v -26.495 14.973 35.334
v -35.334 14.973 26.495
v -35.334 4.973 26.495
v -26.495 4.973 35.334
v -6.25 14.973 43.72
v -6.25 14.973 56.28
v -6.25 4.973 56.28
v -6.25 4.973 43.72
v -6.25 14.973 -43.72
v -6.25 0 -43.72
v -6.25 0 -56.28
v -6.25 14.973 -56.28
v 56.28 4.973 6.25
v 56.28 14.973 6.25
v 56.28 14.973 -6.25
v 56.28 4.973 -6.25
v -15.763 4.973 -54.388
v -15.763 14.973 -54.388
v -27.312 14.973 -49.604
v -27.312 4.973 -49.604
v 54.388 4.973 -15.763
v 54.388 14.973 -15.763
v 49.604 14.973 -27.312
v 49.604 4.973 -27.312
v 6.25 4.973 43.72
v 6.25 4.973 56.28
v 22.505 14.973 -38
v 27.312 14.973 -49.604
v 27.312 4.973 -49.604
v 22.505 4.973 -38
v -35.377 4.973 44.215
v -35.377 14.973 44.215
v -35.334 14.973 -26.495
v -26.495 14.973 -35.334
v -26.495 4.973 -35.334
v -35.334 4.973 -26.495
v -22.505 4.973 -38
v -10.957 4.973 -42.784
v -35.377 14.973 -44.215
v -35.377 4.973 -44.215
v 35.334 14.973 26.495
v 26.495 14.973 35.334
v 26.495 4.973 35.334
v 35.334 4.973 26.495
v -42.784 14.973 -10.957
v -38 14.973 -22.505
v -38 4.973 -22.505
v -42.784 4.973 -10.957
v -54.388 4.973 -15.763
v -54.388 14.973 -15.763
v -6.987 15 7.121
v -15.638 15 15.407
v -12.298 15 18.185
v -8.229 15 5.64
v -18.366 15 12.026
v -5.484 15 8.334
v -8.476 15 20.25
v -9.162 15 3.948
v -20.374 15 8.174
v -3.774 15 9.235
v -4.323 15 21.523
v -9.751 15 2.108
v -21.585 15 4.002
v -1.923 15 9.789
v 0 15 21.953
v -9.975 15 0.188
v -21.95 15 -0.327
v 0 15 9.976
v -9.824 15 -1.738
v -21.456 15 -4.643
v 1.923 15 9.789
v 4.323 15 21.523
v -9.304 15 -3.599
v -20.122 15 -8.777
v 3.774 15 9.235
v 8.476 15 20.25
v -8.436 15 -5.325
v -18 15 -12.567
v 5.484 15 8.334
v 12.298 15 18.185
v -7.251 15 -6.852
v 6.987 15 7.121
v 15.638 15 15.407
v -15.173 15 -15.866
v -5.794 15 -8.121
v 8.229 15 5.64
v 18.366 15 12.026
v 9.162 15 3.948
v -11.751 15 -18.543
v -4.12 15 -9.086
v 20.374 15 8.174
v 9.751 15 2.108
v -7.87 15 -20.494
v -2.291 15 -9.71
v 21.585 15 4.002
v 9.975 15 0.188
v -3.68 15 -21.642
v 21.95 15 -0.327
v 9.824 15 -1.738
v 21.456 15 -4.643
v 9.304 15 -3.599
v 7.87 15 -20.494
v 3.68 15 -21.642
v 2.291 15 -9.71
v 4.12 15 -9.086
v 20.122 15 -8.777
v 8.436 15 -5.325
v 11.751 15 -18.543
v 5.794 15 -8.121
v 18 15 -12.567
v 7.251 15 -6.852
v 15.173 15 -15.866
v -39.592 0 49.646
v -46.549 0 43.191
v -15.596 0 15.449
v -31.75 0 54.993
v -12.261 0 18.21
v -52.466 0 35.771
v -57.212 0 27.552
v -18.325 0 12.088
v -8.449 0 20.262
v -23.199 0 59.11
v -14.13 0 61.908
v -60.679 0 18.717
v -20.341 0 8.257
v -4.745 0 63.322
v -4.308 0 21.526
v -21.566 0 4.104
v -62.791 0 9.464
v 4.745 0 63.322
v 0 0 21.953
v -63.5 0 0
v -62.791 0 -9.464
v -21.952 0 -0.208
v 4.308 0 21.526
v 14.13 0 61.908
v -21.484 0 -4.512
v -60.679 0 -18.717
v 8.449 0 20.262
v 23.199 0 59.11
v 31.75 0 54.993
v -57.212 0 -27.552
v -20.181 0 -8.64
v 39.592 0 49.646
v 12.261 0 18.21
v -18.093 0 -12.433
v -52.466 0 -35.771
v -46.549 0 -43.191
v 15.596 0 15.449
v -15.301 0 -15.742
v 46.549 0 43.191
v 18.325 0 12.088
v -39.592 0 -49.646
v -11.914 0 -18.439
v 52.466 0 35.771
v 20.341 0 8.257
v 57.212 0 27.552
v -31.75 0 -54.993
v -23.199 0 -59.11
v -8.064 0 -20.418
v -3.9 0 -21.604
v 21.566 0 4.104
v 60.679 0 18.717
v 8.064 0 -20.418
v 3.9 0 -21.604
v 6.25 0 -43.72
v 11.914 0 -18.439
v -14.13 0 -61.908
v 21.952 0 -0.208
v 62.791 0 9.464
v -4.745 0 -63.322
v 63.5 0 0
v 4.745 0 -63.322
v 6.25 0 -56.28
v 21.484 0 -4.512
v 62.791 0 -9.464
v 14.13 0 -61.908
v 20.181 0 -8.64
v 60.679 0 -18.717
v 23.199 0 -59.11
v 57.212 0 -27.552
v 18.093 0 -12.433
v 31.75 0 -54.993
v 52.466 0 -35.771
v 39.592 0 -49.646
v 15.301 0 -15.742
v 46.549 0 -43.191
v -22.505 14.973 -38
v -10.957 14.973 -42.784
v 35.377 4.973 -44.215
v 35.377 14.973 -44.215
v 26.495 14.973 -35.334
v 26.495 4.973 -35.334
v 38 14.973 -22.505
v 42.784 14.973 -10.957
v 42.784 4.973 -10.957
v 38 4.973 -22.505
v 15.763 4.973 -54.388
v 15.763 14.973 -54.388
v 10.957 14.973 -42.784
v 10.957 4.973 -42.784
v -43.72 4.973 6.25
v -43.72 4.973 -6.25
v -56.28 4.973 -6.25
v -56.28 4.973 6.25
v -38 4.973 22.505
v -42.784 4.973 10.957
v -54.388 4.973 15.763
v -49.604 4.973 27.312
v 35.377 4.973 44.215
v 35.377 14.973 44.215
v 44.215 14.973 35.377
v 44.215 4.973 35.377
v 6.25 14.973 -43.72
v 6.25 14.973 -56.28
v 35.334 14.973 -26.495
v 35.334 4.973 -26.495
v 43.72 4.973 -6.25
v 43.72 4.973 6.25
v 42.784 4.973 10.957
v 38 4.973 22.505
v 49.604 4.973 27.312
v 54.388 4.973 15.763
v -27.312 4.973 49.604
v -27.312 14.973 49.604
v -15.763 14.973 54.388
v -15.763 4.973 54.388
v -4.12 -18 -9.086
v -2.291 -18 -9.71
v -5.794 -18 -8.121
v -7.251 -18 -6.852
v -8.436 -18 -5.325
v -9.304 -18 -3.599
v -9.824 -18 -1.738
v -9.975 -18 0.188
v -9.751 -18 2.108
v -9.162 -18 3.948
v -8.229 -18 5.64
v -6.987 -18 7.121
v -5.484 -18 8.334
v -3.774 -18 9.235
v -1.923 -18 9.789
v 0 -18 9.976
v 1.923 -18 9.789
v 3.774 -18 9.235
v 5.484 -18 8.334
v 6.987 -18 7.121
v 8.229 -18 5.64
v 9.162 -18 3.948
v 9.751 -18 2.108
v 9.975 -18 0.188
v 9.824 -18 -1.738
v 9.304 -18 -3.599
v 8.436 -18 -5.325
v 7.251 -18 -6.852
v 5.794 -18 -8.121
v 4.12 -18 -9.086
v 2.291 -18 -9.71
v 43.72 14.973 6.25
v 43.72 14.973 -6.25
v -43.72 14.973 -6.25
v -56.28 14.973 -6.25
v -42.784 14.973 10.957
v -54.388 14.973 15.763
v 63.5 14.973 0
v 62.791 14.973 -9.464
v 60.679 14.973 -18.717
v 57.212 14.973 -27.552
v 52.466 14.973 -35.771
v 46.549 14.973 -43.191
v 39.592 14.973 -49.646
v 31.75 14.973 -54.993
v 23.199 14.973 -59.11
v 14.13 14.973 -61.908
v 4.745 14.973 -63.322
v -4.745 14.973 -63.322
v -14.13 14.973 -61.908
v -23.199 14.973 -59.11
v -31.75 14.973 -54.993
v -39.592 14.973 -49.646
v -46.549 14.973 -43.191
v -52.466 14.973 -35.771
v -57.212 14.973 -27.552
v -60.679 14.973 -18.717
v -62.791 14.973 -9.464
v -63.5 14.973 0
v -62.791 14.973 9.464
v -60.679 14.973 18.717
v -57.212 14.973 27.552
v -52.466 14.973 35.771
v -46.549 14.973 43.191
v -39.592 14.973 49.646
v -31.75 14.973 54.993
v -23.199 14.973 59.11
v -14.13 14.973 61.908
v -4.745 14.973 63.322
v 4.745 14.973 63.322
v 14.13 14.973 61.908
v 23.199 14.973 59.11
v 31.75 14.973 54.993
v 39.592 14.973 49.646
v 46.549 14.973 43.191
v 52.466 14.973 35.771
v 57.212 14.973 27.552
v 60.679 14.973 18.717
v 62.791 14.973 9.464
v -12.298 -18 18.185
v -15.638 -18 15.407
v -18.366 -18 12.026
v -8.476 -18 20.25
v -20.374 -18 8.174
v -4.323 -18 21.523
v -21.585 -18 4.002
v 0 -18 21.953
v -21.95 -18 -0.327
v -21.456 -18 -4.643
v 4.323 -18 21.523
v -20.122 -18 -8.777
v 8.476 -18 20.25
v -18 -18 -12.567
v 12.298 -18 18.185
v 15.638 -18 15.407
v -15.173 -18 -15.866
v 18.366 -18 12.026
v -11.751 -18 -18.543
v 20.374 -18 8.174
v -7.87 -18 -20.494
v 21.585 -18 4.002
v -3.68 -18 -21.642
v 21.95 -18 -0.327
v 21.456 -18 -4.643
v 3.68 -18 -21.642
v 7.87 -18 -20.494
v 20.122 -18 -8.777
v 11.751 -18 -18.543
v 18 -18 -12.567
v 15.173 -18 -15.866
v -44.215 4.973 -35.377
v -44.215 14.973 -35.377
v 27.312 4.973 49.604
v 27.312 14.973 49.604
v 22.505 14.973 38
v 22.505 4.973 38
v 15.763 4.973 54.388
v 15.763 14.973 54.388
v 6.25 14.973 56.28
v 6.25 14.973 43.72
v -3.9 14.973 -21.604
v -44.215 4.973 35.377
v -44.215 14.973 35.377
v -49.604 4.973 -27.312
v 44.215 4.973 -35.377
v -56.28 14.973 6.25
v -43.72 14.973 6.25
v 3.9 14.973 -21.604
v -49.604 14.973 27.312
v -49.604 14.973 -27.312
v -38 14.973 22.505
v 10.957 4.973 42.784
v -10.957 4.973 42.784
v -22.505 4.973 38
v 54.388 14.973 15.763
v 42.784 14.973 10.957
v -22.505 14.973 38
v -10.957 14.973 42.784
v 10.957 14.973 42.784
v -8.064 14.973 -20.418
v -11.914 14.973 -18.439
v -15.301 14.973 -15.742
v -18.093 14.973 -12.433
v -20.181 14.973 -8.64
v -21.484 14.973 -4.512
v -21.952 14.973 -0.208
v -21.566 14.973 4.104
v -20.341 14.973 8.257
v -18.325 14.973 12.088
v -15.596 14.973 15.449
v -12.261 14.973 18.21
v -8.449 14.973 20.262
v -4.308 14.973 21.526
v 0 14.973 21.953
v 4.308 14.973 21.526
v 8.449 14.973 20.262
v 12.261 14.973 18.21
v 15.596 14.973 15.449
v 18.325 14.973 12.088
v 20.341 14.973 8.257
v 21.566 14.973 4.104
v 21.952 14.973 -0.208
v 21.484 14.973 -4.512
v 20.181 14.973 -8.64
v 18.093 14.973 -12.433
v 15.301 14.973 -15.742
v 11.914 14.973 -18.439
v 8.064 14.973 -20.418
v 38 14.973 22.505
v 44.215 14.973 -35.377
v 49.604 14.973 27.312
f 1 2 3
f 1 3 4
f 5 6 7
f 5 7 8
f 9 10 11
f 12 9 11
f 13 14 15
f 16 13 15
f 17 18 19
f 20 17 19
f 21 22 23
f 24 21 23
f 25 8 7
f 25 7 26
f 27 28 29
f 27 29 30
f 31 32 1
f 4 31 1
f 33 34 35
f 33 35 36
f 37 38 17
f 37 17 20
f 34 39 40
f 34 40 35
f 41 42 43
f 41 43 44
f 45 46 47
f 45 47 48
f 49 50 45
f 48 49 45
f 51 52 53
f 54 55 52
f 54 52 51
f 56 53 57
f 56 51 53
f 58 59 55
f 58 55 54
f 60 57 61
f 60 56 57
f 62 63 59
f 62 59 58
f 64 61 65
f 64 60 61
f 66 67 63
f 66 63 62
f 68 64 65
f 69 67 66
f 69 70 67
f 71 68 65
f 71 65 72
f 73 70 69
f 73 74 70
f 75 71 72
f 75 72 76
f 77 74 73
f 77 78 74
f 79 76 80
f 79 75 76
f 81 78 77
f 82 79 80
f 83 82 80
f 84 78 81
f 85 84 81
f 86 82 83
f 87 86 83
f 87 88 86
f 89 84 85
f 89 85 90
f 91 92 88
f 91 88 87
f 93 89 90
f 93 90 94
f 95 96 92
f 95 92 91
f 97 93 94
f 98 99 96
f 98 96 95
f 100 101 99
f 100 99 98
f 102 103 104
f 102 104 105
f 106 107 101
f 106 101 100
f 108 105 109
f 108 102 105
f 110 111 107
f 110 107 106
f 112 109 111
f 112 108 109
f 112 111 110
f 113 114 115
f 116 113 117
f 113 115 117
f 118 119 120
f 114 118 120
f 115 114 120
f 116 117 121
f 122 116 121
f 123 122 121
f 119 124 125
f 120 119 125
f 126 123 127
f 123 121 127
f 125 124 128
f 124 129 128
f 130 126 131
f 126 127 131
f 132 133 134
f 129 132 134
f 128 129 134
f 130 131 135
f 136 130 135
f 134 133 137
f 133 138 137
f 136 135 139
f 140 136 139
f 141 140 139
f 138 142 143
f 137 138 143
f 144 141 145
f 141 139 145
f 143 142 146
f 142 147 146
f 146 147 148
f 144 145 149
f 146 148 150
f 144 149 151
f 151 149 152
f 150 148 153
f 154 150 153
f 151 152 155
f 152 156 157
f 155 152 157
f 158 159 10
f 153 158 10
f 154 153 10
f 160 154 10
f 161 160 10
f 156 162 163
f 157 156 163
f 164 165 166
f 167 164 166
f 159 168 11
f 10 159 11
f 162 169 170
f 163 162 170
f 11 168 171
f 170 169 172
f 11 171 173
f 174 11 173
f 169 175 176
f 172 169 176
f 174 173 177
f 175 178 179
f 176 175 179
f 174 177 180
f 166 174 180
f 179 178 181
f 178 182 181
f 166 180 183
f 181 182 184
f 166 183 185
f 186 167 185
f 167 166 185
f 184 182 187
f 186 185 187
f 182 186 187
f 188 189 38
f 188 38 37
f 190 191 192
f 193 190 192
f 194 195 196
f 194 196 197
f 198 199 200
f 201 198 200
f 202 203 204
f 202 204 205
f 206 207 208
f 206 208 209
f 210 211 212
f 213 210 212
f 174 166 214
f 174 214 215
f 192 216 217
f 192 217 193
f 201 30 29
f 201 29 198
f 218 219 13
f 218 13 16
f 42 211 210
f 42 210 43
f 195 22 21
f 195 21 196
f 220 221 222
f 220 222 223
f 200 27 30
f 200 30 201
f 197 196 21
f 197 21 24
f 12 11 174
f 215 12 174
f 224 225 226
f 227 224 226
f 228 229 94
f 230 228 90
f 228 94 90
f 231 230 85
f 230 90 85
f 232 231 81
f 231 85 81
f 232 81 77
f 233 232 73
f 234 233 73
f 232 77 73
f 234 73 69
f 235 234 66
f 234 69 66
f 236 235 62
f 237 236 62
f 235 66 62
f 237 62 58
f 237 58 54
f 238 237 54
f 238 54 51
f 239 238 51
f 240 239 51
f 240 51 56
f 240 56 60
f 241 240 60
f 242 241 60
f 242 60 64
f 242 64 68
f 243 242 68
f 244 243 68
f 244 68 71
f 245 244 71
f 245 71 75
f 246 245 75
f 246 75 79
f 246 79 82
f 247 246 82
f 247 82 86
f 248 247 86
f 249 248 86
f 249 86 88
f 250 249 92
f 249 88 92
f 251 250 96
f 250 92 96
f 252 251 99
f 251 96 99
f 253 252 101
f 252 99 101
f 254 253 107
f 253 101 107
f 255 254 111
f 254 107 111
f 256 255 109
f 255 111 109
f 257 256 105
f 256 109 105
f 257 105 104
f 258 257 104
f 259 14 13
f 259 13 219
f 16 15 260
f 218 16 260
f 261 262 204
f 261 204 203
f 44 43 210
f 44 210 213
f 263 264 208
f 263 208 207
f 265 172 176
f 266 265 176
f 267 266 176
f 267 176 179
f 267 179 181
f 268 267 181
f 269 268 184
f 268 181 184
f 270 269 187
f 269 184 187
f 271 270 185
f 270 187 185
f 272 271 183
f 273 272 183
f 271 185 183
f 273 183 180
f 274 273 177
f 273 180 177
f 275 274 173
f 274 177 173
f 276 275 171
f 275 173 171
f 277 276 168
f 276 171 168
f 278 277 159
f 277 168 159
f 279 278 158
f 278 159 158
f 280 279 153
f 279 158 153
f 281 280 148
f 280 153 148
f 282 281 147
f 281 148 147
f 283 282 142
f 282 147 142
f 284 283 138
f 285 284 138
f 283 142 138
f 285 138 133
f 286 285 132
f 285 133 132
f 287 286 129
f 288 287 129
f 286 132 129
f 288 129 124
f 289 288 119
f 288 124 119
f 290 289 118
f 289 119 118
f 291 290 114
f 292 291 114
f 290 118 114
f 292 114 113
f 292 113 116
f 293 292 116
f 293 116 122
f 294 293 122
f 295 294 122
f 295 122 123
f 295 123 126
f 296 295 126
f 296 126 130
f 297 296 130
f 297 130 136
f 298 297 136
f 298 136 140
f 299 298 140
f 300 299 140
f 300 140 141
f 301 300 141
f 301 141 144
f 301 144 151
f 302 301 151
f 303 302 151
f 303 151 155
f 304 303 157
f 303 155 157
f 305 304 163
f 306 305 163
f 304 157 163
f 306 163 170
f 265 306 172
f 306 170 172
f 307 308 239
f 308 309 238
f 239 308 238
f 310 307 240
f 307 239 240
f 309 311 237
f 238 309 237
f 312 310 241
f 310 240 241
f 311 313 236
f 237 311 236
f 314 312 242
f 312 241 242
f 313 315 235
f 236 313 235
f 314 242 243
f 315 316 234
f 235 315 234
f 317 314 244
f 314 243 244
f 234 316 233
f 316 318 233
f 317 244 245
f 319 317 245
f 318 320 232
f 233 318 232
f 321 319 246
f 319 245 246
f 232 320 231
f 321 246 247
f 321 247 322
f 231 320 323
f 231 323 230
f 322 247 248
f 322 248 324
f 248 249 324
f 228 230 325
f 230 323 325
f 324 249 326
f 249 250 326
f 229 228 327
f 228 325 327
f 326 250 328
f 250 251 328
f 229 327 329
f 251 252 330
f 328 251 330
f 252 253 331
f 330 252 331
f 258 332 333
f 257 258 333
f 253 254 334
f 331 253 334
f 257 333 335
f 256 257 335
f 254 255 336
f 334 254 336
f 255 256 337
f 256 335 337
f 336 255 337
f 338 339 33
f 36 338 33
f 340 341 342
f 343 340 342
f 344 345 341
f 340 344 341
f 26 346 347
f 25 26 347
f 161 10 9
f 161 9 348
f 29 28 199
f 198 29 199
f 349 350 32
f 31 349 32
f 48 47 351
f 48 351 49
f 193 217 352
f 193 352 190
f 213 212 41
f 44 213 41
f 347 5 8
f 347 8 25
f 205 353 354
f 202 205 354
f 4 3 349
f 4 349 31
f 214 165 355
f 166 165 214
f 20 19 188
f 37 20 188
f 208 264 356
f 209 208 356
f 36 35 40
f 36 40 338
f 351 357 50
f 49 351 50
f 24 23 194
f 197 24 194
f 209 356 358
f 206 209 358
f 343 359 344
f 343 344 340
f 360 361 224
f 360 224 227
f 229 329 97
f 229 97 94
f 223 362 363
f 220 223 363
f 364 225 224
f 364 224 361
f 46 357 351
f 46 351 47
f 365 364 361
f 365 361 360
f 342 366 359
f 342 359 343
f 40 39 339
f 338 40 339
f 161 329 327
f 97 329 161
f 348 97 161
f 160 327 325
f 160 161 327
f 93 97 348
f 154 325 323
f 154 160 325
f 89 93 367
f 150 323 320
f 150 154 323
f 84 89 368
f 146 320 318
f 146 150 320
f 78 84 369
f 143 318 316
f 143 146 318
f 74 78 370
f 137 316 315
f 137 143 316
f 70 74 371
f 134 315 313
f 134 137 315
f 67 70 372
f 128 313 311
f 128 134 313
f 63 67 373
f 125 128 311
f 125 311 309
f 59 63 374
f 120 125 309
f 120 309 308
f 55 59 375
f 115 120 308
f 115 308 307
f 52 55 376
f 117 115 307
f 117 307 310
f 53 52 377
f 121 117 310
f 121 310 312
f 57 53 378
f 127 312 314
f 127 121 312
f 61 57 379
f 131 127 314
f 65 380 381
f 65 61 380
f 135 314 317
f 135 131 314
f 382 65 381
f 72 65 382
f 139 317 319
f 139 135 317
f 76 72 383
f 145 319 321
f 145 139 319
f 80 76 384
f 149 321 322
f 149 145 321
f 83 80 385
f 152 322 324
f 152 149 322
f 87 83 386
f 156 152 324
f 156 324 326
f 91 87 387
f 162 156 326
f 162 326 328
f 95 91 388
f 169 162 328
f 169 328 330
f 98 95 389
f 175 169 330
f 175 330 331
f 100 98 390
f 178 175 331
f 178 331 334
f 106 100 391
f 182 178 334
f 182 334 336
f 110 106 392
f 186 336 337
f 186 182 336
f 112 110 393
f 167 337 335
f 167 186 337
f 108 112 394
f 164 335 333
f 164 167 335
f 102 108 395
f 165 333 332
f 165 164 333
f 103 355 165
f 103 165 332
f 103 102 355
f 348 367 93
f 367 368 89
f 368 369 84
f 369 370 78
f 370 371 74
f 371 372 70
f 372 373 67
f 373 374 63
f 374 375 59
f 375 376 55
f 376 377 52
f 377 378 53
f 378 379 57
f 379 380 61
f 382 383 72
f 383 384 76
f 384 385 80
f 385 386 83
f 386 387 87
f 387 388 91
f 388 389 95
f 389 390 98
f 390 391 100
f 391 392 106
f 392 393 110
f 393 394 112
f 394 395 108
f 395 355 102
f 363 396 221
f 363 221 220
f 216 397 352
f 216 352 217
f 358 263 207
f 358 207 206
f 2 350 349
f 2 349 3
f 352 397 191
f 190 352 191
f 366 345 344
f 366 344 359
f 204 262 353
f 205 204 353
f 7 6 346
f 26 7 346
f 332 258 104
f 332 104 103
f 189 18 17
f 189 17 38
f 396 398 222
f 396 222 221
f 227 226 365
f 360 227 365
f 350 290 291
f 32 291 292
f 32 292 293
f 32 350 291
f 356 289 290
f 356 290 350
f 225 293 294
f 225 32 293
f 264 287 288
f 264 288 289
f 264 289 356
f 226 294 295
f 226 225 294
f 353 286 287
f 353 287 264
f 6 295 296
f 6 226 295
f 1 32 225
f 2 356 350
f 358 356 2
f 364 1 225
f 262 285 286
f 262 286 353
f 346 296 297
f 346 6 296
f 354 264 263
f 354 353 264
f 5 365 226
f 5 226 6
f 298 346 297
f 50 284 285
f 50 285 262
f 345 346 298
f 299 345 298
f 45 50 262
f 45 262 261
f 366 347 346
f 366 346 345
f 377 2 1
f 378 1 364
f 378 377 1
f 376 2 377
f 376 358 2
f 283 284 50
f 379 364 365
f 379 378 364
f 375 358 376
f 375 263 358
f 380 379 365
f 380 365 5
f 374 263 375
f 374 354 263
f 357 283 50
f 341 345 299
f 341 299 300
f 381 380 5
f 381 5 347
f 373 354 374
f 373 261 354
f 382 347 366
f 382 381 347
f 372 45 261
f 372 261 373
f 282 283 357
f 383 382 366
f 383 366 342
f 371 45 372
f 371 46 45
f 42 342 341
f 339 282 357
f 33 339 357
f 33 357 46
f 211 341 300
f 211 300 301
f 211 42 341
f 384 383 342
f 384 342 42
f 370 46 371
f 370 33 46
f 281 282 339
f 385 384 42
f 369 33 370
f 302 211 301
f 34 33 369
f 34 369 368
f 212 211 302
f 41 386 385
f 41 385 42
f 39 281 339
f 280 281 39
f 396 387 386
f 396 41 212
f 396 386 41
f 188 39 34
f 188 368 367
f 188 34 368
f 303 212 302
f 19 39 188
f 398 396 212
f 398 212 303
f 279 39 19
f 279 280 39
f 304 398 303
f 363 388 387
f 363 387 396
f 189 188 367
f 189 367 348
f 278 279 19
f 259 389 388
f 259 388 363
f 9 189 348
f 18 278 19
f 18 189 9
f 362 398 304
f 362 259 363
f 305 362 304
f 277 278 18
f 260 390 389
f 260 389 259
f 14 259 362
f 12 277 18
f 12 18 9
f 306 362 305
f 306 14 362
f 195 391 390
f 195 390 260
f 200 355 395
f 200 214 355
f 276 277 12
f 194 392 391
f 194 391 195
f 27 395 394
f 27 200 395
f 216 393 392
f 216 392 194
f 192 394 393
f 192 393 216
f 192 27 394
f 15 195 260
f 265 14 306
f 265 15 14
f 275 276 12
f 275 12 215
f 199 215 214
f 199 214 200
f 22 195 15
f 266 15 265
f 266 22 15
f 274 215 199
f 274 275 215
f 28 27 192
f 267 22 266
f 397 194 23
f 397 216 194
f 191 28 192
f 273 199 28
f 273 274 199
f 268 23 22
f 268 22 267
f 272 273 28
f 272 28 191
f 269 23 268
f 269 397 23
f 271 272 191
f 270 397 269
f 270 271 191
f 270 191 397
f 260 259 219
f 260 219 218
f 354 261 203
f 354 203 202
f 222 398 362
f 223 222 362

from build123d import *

# Parameters (mm, degrees)
SKETCH1_R                = 63.5
BOSS_EXTRUDE1_DEPTH      = 14.973360437
SKETCH2_W                = 12.5
SKETCH2_H                = 12.56
CUT_EXTRUDE1_DEPTH       = 10
CIRPATTERN1_COUNT        = 16
SKETCH5_W                = 12.5
SKETCH5_H                = 12.56
CUT_EXTRUDE3_DEPTH       = 37
CUT_EXTRUDE3_DEPTH_BACK  = 31
SKETCH6_R                = 17.625930659
CUT_EXTRUDE4_DEPTH       = 26
CUT_EXTRUDE4_DEPTH_BACK  = 37
CUT_EXTRUDE9_DEPTH       = 19
CUT_EXTRUDE9_DEPTH_BACK  = 11
SKETCH13_R               = 21.952850423
BOSS_EXTRUDE4_DEPTH      = 15
BOSS_EXTRUDE4_DEPTH_BACK = 18
SKETCH16_R               = 9.976383377
CUT_EXTRUDE11_DEPTH      = 33
CUT_EXTRUDE11_DEPTH_BACK = 29
CUT_EXTRUDE15_DEPTH      = 27
CUT_EXTRUDE15_DEPTH_BACK = 29


with BuildPart() as part:
    # Sketch1 → Boss-Extrude1 (new body)
    with BuildSketch(Plane(origin=(0, 0, 0), x_dir=(1, 0, 0), z_dir=(0, 1, 0))):
        Circle(SKETCH1_R)
    extrude(amount=BOSS_EXTRUDE1_DEPTH)

    # Sketch2 → Cut-Extrude1 (cut)
    with BuildSketch(Plane(origin=(0, 14.973360437, 0), x_dir=(1, 0, 0), z_dir=(0, 1, 0))):
        with Locations((0, -50)):
            Rectangle(SKETCH2_W, SKETCH2_H)
    cut_extrude1 = extrude(amount=-CUT_EXTRUDE1_DEPTH, mode=Mode.SUBTRACT)

    # CirPattern1: Cut-Extrude1 ×16 about axis
    cirpattern1_axis = Axis((0, 0, 0), (0, 1, 0))
    for i in range(1, CIRPATTERN1_COUNT):
        add(cut_extrude1.rotate(cirpattern1_axis, i * 360 / CIRPATTERN1_COUNT), mode=Mode.SUBTRACT)

    # Sketch5 → Cut-Extrude3 (cut, two sides)
    with BuildSketch(Plane(origin=(0, 0, 0), x_dir=(1, 0, 0), z_dir=(0, 1, 0))) as cut_extrude3_sk:
        with Locations((0, 50)):
            Rectangle(SKETCH5_W, SKETCH5_H)
    extrude(amount=CUT_EXTRUDE3_DEPTH, mode=Mode.SUBTRACT)
    extrude(cut_extrude3_sk.sketch, amount=-CUT_EXTRUDE3_DEPTH_BACK, mode=Mode.SUBTRACT)

    # Sketch6 → Cut-Extrude4 (cut, two sides)
    with BuildSketch(Plane(origin=(0, 14.973360437, 0), x_dir=(1, 0, 0), z_dir=(0, 1, 0))) as cut_extrude4_sk:
        Circle(SKETCH6_R)
    extrude(amount=CUT_EXTRUDE4_DEPTH, mode=Mode.SUBTRACT)
    extrude(cut_extrude4_sk.sketch, amount=-CUT_EXTRUDE4_DEPTH_BACK, mode=Mode.SUBTRACT)

    # Sketch9 → Cut-Extrude9 (cut, two sides)
    with BuildSketch(Plane(origin=(0, 0, 0), x_dir=(1, 0, 0), z_dir=(0, 1, 0))) as cut_extrude9_sk:
        Polygon((-6.25, 43.72), (0, -15.098638444), (6.25, 43.72), align=None)
    extrude(amount=CUT_EXTRUDE9_DEPTH, mode=Mode.SUBTRACT)
    extrude(cut_extrude9_sk.sketch, amount=-CUT_EXTRUDE9_DEPTH_BACK, mode=Mode.SUBTRACT)

    # Sketch13 → Boss-Extrude4 (add, two sides)
    with BuildSketch(Plane(origin=(0, 0, 0), x_dir=(1, 0, 0), z_dir=(0, 1, 0))) as boss_extrude4_sk:
        Circle(SKETCH13_R)
    extrude(amount=BOSS_EXTRUDE4_DEPTH)
    extrude(boss_extrude4_sk.sketch, amount=-BOSS_EXTRUDE4_DEPTH_BACK)

    # Sketch16 → Cut-Extrude11 (cut, two sides)
    with BuildSketch(Plane(origin=(0, 0, 0), x_dir=(1, 0, 0), z_dir=(0, 1, 0))) as cut_extrude11_sk:
        Circle(SKETCH16_R)
    extrude(amount=CUT_EXTRUDE11_DEPTH, mode=Mode.SUBTRACT)
    extrude(cut_extrude11_sk.sketch, amount=-CUT_EXTRUDE11_DEPTH_BACK, mode=Mode.SUBTRACT)

    # Sketch17 → Cut-Extrude15 (cut, two sides)
    with BuildSketch(Plane(origin=(0, 0, 0), x_dir=(1, 0, 0), z_dir=(0, 1, 0))) as cut_extrude15_sk:
        Polygon((-6.25, 43.72), (0, -9.976383377), (6.25, 43.72), align=None)
    extrude(amount=CUT_EXTRUDE15_DEPTH, mode=Mode.SUBTRACT)
    extrude(cut_extrude15_sk.sketch, amount=-CUT_EXTRUDE15_DEPTH_BACK, mode=Mode.SUBTRACT)


solid = part.part
